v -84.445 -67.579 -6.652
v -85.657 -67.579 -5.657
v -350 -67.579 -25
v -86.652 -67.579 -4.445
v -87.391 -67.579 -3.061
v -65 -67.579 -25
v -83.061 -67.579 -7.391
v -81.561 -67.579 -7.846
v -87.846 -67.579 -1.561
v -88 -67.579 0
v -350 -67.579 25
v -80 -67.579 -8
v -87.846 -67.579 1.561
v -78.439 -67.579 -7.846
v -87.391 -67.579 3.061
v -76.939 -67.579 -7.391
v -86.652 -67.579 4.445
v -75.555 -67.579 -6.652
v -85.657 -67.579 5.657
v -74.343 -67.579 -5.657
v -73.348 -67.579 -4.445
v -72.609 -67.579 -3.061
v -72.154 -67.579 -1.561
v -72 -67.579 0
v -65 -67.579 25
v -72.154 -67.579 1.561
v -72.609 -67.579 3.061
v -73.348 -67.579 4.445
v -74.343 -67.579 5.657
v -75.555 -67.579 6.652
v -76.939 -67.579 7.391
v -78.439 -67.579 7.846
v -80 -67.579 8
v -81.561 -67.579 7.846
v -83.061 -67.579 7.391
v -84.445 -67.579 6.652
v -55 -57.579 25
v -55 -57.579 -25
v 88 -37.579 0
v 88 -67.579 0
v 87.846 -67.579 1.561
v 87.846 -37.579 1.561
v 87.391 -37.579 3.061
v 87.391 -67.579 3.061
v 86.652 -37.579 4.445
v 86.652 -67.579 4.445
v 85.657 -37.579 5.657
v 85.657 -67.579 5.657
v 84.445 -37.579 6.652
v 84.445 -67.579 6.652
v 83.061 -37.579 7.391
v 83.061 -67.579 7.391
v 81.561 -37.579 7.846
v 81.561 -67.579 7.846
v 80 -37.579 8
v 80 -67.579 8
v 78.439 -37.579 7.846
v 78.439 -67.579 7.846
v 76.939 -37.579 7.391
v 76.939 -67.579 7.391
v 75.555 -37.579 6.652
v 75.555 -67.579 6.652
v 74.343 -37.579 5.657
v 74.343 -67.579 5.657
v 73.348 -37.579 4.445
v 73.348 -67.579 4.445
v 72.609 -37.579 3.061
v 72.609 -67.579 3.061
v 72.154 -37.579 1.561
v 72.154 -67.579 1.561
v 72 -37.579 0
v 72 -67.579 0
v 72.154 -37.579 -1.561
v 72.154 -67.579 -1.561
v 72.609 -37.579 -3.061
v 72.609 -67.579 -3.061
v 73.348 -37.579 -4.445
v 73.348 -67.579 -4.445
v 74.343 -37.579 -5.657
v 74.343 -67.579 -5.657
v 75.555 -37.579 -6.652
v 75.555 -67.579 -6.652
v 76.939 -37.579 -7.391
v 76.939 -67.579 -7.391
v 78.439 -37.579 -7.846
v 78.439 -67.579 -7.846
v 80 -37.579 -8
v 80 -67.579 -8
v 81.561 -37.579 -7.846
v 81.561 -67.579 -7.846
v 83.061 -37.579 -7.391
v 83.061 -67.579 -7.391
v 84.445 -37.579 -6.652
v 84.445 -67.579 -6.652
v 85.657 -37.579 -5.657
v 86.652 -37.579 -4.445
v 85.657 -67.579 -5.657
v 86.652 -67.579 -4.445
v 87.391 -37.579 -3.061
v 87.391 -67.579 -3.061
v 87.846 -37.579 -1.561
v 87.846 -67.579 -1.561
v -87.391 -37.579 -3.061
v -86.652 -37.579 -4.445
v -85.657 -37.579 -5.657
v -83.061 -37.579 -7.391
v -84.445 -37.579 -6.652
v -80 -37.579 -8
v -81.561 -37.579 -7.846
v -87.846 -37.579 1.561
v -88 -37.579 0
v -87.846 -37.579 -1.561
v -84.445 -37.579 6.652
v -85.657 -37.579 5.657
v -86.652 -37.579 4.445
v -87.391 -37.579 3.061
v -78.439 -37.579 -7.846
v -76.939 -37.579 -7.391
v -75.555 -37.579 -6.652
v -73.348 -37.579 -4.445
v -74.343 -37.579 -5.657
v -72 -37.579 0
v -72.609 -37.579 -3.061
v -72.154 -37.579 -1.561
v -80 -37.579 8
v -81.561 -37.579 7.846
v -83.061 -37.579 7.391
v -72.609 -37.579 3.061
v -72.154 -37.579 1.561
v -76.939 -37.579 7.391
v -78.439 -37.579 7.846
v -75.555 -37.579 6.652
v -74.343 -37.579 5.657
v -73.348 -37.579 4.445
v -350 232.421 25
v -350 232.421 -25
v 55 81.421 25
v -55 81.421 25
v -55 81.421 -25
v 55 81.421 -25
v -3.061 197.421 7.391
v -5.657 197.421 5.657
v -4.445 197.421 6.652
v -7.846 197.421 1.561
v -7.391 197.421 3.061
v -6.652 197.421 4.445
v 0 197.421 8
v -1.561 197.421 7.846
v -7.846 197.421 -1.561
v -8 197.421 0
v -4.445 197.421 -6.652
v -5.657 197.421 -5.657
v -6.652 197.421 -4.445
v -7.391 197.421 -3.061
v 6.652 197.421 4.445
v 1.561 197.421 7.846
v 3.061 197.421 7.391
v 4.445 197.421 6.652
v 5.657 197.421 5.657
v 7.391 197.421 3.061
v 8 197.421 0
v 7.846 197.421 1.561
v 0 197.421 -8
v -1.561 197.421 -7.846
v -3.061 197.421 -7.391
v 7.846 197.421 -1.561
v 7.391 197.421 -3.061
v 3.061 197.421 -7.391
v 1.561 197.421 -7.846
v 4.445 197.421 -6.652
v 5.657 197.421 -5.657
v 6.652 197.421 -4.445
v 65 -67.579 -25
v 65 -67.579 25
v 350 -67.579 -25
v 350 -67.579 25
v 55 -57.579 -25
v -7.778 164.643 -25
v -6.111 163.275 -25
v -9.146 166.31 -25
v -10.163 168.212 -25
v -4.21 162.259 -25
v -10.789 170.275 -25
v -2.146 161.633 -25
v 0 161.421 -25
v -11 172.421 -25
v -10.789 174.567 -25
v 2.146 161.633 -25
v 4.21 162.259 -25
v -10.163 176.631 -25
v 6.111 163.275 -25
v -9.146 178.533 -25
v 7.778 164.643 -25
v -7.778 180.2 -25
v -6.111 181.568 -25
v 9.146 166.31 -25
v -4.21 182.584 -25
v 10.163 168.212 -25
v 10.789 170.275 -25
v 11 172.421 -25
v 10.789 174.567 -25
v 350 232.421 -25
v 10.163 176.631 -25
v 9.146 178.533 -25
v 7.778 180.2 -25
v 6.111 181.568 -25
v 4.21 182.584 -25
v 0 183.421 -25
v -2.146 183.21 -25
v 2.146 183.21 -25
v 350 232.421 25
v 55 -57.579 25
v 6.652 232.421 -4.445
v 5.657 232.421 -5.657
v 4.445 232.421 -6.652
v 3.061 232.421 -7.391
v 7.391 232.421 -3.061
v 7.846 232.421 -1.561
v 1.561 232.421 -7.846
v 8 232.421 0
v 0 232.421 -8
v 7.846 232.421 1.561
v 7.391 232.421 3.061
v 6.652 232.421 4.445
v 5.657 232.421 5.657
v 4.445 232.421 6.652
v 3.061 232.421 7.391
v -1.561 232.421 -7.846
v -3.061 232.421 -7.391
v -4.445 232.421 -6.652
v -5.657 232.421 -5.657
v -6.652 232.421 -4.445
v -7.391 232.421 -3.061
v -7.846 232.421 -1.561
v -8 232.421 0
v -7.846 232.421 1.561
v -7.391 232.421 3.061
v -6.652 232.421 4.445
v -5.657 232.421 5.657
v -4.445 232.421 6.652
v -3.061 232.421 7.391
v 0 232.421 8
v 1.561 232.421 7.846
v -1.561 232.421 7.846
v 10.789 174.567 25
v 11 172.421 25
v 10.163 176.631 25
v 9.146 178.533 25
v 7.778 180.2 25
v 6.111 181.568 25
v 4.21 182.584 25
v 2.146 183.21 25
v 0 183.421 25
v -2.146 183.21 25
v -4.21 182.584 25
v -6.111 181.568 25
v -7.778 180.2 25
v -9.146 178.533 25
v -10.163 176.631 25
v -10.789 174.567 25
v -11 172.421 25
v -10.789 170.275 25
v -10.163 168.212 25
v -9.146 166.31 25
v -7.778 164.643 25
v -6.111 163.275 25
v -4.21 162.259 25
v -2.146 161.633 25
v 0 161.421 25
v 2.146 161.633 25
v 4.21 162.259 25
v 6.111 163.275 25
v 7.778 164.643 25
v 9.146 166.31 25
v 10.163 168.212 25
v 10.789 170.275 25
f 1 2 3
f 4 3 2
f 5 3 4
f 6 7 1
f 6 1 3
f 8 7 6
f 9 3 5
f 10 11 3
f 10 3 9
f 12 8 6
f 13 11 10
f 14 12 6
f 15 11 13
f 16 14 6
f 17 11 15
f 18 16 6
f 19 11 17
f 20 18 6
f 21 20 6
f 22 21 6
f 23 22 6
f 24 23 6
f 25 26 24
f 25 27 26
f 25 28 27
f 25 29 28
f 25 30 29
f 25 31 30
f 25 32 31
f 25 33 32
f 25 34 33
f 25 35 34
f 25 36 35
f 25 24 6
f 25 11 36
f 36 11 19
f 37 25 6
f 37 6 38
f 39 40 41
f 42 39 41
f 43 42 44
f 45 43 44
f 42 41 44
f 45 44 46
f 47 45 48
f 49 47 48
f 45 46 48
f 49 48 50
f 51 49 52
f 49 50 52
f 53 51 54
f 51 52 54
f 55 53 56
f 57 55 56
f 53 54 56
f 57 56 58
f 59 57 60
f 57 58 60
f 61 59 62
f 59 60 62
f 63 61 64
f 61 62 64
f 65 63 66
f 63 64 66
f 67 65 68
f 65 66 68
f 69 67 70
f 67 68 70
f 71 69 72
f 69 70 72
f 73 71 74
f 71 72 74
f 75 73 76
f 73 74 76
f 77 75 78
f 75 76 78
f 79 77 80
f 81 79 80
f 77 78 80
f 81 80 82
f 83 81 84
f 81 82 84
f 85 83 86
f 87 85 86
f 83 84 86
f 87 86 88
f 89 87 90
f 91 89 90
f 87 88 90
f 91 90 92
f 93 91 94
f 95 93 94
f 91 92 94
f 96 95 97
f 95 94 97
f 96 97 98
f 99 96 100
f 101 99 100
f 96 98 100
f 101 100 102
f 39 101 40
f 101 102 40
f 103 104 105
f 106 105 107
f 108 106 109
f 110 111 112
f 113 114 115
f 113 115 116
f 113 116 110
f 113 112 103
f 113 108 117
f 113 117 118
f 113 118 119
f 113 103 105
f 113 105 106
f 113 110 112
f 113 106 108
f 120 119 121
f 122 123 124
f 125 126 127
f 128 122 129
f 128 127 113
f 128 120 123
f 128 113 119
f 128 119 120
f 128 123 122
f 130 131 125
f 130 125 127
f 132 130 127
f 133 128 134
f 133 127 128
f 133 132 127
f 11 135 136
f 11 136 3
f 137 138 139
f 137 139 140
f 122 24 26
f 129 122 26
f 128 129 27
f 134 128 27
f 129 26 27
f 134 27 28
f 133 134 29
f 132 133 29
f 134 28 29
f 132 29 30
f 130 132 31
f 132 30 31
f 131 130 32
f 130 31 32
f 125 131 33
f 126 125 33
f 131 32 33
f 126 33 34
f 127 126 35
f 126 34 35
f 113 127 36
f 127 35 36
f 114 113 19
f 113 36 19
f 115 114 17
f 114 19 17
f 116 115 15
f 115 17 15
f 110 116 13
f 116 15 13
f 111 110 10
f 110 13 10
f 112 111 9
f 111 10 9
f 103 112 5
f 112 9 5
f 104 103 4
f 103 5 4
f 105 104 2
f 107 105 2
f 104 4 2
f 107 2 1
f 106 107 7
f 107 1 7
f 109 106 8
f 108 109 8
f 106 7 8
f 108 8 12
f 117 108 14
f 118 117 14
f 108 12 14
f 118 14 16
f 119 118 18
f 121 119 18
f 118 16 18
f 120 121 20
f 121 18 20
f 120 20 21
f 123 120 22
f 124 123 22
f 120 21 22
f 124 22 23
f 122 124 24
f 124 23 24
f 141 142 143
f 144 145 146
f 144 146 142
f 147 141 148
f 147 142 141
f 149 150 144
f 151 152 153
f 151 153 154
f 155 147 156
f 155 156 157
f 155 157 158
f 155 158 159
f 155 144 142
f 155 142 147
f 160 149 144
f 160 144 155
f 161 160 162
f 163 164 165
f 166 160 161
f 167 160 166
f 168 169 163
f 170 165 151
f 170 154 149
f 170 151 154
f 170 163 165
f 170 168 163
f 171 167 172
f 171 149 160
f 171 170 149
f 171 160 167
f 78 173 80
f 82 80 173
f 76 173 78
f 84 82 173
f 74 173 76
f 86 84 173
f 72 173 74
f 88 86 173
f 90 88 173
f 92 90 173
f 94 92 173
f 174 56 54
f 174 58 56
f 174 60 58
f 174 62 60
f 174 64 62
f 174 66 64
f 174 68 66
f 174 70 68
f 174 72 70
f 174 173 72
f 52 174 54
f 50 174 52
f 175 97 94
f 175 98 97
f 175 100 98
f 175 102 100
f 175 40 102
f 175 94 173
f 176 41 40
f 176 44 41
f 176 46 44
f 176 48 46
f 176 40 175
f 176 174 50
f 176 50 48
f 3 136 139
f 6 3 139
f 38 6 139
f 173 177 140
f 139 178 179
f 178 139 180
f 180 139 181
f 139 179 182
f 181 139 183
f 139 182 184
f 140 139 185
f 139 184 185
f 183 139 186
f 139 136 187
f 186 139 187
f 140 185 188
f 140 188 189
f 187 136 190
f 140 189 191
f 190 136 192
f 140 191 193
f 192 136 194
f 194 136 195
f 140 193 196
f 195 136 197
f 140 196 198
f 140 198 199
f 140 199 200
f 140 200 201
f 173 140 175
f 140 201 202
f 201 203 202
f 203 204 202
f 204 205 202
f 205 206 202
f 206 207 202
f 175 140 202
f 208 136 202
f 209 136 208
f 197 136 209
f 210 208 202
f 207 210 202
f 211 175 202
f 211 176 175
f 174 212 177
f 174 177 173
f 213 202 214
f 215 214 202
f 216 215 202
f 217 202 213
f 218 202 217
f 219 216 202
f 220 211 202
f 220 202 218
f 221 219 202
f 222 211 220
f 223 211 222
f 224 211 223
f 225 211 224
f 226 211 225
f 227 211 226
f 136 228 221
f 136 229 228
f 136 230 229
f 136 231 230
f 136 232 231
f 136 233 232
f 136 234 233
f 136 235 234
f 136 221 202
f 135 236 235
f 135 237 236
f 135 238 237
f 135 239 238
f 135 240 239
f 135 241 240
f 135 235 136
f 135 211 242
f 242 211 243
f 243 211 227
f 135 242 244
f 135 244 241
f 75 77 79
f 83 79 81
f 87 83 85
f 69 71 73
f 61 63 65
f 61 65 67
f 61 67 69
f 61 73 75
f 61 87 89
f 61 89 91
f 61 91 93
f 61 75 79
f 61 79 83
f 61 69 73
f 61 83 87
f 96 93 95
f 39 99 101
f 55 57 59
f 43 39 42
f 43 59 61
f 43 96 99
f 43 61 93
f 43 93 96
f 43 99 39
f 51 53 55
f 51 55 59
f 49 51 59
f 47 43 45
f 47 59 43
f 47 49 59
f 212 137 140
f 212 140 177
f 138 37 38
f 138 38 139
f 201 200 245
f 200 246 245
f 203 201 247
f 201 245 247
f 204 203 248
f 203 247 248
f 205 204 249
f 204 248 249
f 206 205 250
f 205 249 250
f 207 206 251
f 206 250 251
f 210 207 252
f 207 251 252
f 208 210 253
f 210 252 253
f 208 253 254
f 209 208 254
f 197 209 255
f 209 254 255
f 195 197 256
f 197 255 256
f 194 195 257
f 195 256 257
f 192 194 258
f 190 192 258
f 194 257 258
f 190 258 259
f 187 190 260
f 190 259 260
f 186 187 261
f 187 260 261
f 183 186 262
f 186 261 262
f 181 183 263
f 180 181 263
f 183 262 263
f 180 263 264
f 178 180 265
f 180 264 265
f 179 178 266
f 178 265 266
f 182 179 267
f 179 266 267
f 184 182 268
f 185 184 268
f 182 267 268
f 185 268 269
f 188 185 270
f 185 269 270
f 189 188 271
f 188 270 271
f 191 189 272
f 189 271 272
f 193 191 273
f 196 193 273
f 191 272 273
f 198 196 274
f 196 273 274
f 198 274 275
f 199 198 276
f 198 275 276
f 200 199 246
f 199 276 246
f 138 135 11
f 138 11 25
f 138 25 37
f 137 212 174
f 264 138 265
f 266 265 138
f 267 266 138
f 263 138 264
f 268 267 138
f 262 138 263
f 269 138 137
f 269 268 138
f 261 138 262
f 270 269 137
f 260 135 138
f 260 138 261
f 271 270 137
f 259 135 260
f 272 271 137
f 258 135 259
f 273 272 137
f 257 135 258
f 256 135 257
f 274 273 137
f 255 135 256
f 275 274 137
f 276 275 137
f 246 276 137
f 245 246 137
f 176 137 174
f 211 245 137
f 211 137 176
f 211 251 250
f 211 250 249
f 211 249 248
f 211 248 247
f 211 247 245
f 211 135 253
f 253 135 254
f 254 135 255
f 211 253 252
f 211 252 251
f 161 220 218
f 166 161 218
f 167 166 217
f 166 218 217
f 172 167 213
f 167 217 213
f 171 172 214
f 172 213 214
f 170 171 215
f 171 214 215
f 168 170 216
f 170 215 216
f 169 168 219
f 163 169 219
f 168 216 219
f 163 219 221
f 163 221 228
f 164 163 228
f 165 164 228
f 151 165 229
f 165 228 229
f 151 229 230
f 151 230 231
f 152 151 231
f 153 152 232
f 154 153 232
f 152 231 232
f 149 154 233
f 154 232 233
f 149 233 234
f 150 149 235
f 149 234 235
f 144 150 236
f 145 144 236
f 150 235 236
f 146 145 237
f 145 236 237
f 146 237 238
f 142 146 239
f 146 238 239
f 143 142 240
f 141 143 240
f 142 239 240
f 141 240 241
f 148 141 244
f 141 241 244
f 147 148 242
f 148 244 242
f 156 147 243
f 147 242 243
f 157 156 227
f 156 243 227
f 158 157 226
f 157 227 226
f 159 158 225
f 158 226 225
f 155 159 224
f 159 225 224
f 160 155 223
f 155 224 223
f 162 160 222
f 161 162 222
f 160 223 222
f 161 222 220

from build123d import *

# Parameters (mm, degrees)
BOSS_EXTRUDE1_DEPTH     = 25
SKETCH2_R               = 11
CUT_EXTRUDE1_DEPTH      = 26
CUT_EXTRUDE1_DEPTH_BACK = 26
SKETCH3_R               = 8
CUT_EXTRUDE2_DEPTH      = 35
SKETCH4_R               = 8
CUT_EXTRUDE3_DEPTH      = 30


with BuildPart() as part:
    # Sketch1 → Boss-Extrude1 (new body, symmetric)
    with BuildSketch(Plane.XY):
        Polygon((350, 232.421392473), (-350, 232.421392473), (-350, -67.578607527), (-65, -67.578607527), (-55, -57.578607527), (-55, 81.421392473), (55, 81.421392473), (55, -57.578607527), (65, -67.578607527), (350, -67.578607527), align=None)
    extrude(amount=BOSS_EXTRUDE1_DEPTH, both=True)

    # Sketch2 → Cut-Extrude1 (cut, two sides)
    with BuildSketch(Plane.XY) as cut_extrude1_sk:
        with Locations((0, 172.421392473)):
            Circle(SKETCH2_R)
    extrude(amount=CUT_EXTRUDE1_DEPTH, mode=Mode.SUBTRACT)
    extrude(cut_extrude1_sk.sketch, amount=-CUT_EXTRUDE1_DEPTH_BACK, mode=Mode.SUBTRACT)

    # Sketch3 → Cut-Extrude2 (cut)
    with BuildSketch(Plane(origin=(0, 232.421392473, 0), x_dir=(1, 0, 0), z_dir=(0, 1, 0))):
        Circle(SKETCH3_R)
    extrude(amount=-CUT_EXTRUDE2_DEPTH, mode=Mode.SUBTRACT)

    # Sketch4 → Cut-Extrude3 (cut)
    with BuildSketch(Plane.XZ.offset(67.578607527)):
        with Locations((-80, 0)):
            Circle(SKETCH4_R)
        with Locations((80, 0)):
            Circle(SKETCH4_R)
    extrude(amount=-CUT_EXTRUDE3_DEPTH, mode=Mode.SUBTRACT)


solid = part.part
